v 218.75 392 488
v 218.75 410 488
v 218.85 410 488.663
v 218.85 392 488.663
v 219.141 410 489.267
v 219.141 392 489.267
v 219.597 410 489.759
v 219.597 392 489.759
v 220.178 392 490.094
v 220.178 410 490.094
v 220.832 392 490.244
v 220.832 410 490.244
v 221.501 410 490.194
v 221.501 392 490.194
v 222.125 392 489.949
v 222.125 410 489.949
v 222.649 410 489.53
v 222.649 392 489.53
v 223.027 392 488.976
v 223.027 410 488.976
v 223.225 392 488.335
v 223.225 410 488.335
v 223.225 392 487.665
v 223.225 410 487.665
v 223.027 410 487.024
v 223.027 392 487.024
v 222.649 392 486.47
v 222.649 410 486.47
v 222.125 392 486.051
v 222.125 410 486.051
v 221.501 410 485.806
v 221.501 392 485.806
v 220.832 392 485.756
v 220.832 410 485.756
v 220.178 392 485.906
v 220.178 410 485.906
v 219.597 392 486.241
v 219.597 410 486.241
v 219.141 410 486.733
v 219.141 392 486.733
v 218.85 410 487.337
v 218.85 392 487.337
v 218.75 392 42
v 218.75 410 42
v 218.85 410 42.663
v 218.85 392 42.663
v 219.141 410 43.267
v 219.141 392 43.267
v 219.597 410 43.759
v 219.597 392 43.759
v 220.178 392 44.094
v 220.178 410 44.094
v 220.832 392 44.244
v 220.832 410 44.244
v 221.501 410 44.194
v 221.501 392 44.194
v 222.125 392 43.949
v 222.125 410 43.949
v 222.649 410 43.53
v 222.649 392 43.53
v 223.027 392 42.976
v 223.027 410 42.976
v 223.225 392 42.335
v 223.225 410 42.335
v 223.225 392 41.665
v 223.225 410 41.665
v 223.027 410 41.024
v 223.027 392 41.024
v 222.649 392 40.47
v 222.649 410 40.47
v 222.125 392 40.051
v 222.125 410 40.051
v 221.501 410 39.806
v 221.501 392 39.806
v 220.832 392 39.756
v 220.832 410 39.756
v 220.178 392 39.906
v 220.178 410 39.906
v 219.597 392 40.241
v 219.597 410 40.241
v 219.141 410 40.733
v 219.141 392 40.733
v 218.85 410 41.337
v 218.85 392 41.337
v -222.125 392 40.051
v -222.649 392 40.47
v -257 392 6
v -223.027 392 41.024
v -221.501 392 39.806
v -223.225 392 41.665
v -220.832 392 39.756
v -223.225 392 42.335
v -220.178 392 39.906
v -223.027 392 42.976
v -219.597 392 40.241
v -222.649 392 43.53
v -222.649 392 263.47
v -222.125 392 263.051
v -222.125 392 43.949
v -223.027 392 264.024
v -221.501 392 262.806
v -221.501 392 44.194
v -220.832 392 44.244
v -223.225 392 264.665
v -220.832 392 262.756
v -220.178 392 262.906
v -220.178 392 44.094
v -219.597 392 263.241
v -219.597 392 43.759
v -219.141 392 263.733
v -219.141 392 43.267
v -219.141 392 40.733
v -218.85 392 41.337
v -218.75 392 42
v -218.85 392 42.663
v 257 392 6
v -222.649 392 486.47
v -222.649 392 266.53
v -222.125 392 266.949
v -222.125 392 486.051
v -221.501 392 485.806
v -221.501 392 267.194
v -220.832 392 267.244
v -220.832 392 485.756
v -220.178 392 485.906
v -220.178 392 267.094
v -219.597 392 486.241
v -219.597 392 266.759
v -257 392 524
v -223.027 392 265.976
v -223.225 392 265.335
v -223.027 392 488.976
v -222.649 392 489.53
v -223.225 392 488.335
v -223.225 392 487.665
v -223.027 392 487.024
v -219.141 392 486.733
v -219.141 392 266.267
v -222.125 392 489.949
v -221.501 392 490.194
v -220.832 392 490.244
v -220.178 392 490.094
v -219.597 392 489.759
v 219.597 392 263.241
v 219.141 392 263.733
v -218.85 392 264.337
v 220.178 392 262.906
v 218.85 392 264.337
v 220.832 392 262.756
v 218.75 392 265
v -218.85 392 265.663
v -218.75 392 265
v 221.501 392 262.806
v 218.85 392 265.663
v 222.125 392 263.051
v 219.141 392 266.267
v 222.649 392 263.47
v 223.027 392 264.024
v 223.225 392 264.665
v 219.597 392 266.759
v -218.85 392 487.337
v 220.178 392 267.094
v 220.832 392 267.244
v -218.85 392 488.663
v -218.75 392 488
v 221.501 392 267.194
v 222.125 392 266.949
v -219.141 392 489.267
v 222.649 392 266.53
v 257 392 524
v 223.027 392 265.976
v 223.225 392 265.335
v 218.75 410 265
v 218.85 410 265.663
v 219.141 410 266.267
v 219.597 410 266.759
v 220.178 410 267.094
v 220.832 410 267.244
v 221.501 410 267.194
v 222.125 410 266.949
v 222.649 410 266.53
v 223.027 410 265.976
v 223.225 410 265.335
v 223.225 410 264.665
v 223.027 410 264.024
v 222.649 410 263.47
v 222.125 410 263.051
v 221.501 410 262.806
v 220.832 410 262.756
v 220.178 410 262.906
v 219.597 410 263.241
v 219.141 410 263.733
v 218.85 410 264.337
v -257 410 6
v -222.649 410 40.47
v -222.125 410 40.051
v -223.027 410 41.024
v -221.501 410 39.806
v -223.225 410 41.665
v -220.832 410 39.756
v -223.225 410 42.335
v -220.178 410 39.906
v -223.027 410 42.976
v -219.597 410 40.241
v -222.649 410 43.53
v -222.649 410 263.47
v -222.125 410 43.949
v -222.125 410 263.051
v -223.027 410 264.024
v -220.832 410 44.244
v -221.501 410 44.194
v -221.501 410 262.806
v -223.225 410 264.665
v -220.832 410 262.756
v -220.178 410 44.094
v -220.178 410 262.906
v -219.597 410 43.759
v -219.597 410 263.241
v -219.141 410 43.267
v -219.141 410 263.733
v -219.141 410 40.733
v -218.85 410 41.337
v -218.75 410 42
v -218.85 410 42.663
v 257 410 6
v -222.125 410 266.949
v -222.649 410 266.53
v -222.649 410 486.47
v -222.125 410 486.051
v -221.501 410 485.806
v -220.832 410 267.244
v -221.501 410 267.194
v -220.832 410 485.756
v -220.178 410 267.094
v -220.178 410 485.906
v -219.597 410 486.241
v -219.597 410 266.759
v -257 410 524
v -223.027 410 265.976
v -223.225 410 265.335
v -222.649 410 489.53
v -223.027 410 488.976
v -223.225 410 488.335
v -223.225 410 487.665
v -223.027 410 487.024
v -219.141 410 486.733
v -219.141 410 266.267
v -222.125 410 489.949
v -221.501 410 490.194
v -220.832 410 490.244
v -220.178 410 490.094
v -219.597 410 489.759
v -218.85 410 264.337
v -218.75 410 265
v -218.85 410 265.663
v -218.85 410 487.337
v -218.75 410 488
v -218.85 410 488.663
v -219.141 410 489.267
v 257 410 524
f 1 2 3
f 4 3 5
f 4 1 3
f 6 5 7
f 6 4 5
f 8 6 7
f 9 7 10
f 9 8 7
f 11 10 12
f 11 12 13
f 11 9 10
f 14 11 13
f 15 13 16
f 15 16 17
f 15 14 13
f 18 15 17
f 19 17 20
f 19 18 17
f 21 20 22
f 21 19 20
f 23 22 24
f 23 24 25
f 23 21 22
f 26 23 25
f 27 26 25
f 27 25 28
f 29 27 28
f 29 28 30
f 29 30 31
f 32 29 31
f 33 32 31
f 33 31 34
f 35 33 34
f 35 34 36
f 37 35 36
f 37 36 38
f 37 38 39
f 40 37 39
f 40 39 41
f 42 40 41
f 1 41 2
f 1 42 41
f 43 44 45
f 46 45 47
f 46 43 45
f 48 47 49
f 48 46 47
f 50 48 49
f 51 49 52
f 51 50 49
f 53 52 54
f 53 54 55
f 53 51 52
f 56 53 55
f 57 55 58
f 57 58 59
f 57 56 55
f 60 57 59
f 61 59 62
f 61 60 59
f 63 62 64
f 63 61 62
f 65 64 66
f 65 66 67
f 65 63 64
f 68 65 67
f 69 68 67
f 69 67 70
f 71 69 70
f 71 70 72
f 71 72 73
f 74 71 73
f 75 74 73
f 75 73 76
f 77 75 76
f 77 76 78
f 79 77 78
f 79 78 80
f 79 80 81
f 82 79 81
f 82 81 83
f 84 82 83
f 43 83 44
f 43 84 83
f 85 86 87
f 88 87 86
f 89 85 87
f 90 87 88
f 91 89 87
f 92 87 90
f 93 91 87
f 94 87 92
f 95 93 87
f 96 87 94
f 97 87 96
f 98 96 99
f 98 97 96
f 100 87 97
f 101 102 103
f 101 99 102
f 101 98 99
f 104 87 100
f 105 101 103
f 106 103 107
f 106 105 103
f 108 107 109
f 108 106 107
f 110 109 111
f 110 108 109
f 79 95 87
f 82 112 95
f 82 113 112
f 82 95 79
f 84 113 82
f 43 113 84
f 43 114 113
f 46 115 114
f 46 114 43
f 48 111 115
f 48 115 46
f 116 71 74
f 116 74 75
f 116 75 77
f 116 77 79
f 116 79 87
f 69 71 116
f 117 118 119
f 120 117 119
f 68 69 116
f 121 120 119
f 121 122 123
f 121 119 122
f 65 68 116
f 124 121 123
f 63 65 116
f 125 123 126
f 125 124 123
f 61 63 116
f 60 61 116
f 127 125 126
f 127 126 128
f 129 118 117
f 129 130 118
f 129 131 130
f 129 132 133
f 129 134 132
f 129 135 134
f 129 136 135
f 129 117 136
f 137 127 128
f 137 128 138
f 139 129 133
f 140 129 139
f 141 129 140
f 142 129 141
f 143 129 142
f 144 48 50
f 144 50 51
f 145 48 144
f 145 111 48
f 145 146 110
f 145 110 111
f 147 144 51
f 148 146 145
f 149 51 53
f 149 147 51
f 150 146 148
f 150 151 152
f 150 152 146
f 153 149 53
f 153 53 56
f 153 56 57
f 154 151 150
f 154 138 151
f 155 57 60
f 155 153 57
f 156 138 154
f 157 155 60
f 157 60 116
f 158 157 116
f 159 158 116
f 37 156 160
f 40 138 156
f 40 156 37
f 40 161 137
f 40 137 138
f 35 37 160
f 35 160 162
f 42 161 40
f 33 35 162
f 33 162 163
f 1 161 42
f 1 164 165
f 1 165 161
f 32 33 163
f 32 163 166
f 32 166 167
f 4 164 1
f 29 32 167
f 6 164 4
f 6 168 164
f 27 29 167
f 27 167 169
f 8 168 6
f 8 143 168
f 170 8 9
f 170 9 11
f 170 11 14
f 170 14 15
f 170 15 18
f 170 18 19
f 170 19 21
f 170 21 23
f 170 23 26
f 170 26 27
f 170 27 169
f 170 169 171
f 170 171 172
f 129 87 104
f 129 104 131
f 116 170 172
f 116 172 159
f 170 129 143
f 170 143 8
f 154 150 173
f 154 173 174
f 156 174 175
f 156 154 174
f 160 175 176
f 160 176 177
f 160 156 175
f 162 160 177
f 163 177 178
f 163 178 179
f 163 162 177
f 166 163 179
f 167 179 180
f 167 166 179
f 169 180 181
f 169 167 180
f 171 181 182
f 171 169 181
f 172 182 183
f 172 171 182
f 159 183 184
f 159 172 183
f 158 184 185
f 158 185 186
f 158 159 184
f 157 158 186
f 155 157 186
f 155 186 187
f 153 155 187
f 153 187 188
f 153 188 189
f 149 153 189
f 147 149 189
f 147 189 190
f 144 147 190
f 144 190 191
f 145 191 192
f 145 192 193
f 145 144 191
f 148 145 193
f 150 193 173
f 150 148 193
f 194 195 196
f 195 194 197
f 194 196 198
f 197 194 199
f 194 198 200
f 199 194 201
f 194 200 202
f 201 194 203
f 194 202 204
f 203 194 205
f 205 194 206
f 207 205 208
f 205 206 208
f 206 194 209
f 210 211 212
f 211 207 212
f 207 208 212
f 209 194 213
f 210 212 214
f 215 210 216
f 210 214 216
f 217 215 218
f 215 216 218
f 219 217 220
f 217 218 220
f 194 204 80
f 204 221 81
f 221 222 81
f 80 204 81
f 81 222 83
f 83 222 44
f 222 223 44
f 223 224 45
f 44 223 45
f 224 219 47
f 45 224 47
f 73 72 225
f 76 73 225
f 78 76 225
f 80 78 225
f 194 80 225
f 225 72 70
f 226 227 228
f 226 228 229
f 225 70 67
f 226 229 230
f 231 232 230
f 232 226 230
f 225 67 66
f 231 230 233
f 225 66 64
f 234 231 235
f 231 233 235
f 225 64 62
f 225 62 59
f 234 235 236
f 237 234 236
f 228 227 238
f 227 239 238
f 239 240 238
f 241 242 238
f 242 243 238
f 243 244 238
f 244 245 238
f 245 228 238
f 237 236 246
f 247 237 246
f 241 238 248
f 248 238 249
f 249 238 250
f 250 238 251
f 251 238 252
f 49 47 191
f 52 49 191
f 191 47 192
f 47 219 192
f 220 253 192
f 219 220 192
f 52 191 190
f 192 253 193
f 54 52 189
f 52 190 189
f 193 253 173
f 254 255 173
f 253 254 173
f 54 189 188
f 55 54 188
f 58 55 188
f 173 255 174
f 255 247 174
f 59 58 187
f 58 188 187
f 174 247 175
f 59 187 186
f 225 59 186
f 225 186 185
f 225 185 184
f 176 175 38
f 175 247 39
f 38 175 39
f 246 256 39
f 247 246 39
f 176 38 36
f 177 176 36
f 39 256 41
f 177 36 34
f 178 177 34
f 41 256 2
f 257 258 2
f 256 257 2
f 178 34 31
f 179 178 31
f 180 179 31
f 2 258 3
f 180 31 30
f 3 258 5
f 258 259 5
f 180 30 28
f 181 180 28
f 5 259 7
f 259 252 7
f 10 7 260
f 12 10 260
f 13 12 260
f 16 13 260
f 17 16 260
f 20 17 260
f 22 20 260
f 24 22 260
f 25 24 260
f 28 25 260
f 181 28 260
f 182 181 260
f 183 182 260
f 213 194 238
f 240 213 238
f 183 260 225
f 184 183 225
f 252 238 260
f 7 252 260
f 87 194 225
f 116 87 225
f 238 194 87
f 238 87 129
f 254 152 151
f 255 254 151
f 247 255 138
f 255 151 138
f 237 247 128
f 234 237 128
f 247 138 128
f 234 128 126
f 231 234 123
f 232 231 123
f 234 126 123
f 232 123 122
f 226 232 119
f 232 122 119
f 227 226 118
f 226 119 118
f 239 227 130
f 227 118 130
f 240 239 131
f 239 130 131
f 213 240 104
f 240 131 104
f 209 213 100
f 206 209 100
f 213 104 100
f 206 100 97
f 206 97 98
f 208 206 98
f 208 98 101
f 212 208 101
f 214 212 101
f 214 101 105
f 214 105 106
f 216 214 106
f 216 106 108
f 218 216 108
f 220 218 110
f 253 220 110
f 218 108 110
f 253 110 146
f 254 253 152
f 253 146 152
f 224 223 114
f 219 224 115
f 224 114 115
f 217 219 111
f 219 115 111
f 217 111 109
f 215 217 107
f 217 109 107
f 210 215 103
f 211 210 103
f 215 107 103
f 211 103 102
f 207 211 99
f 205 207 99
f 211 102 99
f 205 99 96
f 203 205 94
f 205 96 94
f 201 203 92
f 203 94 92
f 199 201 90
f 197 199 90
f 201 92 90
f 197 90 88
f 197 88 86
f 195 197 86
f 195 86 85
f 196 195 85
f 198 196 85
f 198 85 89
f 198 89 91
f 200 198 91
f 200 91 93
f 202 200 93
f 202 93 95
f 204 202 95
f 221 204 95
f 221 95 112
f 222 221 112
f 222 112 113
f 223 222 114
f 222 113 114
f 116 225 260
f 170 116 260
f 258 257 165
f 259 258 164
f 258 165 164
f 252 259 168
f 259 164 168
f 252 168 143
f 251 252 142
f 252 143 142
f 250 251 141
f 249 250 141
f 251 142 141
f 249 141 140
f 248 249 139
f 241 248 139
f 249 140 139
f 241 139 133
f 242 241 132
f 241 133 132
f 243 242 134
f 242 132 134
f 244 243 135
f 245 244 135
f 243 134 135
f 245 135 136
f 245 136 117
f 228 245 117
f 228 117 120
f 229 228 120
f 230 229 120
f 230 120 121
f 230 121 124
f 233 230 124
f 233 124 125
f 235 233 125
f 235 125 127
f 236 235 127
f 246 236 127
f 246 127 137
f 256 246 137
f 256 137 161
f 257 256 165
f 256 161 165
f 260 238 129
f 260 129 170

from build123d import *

# Parameters (mm, degrees)
SKETCH049_W                        = 514
SKETCH049_H                        = 518
PAD018_DEPTH                       = 18
SKETCH050_R                        = 2.25
POCKET031_DEPTH                    = 18
SKETCH050_LINEARPATTERN004_2_R     = 2.25
POCKET031_LINEARPATTERN004_2_DEPTH = 18
SKETCH050_LINEARPATTERN004_3_R     = 2.25
POCKET031_LINEARPATTERN004_3_DEPTH = 18
BODY017_PLACEMENT_ANGLE            = 90


with BuildPart() as part:
    # Sketch049 → Pad018 (new body)
    with BuildSketch(Plane.XY):
        with Locations((0, 259)):
            Rectangle(SKETCH049_W, SKETCH049_H)
    extrude(amount=PAD018_DEPTH)

    # Sketch050 (on Face6 of Pad018) → Pocket031 (cut)
    with BuildSketch(Plane.XY.offset(18)):
        with Locations((-221, 36)):
            Circle(SKETCH050_R)
    pocket031 = extrude(amount=-POCKET031_DEPTH, mode=Mode.SUBTRACT)

    # Sketch050 LinearPattern004 2 → Pocket031 LinearPattern004 2 (cut)
    with BuildSketch(Plane(origin=(0, 223, 18), x_dir=(1, 0, 0), z_dir=(0, 0, 1))):
        with Locations((-221, 36)):
            Circle(SKETCH050_LINEARPATTERN004_2_R)
    pocket031_linearpattern004_2 = extrude(amount=-POCKET031_LINEARPATTERN004_2_DEPTH, mode=Mode.SUBTRACT)

    # Sketch050 LinearPattern004 3 → Pocket031 LinearPattern004 3 (cut)
    with BuildSketch(Plane(origin=(0, 446, 18), x_dir=(1, 0, 0), z_dir=(0, 0, 1))):
        with Locations((-221, 36)):
            Circle(SKETCH050_LINEARPATTERN004_3_R)
    pocket031_linearpattern004_3 = extrude(amount=-POCKET031_LINEARPATTERN004_3_DEPTH, mode=Mode.SUBTRACT)

    # Mirrored011: Pocket031, Pocket031 LinearPattern004 2, Pocket031 LinearPattern004 3 across Sketch050 V_Axis
    add(pocket031.mirror(Plane(origin=(0, 0, 18), x_dir=(0, 0, 1), z_dir=(1, 0, 0))), mode=Mode.SUBTRACT)
    add(pocket031_linearpattern004_2.mirror(Plane(origin=(0, 0, 18), x_dir=(0, 0, 1), z_dir=(1, 0, 0))), mode=Mode.SUBTRACT)
    add(pocket031_linearpattern004_3.mirror(Plane(origin=(0, 0, 18), x_dir=(0, 0, 1), z_dir=(1, 0, 0))), mode=Mode.SUBTRACT)


with BuildPart() as part_1:
    # Body017 placement: moved
    add(part.part.moved(Location((0, 410, 6))).rotate(Axis((0, 410, 6), (1, 0, 0)), BODY017_PLACEMENT_ANGLE))


solid = part_1.part
